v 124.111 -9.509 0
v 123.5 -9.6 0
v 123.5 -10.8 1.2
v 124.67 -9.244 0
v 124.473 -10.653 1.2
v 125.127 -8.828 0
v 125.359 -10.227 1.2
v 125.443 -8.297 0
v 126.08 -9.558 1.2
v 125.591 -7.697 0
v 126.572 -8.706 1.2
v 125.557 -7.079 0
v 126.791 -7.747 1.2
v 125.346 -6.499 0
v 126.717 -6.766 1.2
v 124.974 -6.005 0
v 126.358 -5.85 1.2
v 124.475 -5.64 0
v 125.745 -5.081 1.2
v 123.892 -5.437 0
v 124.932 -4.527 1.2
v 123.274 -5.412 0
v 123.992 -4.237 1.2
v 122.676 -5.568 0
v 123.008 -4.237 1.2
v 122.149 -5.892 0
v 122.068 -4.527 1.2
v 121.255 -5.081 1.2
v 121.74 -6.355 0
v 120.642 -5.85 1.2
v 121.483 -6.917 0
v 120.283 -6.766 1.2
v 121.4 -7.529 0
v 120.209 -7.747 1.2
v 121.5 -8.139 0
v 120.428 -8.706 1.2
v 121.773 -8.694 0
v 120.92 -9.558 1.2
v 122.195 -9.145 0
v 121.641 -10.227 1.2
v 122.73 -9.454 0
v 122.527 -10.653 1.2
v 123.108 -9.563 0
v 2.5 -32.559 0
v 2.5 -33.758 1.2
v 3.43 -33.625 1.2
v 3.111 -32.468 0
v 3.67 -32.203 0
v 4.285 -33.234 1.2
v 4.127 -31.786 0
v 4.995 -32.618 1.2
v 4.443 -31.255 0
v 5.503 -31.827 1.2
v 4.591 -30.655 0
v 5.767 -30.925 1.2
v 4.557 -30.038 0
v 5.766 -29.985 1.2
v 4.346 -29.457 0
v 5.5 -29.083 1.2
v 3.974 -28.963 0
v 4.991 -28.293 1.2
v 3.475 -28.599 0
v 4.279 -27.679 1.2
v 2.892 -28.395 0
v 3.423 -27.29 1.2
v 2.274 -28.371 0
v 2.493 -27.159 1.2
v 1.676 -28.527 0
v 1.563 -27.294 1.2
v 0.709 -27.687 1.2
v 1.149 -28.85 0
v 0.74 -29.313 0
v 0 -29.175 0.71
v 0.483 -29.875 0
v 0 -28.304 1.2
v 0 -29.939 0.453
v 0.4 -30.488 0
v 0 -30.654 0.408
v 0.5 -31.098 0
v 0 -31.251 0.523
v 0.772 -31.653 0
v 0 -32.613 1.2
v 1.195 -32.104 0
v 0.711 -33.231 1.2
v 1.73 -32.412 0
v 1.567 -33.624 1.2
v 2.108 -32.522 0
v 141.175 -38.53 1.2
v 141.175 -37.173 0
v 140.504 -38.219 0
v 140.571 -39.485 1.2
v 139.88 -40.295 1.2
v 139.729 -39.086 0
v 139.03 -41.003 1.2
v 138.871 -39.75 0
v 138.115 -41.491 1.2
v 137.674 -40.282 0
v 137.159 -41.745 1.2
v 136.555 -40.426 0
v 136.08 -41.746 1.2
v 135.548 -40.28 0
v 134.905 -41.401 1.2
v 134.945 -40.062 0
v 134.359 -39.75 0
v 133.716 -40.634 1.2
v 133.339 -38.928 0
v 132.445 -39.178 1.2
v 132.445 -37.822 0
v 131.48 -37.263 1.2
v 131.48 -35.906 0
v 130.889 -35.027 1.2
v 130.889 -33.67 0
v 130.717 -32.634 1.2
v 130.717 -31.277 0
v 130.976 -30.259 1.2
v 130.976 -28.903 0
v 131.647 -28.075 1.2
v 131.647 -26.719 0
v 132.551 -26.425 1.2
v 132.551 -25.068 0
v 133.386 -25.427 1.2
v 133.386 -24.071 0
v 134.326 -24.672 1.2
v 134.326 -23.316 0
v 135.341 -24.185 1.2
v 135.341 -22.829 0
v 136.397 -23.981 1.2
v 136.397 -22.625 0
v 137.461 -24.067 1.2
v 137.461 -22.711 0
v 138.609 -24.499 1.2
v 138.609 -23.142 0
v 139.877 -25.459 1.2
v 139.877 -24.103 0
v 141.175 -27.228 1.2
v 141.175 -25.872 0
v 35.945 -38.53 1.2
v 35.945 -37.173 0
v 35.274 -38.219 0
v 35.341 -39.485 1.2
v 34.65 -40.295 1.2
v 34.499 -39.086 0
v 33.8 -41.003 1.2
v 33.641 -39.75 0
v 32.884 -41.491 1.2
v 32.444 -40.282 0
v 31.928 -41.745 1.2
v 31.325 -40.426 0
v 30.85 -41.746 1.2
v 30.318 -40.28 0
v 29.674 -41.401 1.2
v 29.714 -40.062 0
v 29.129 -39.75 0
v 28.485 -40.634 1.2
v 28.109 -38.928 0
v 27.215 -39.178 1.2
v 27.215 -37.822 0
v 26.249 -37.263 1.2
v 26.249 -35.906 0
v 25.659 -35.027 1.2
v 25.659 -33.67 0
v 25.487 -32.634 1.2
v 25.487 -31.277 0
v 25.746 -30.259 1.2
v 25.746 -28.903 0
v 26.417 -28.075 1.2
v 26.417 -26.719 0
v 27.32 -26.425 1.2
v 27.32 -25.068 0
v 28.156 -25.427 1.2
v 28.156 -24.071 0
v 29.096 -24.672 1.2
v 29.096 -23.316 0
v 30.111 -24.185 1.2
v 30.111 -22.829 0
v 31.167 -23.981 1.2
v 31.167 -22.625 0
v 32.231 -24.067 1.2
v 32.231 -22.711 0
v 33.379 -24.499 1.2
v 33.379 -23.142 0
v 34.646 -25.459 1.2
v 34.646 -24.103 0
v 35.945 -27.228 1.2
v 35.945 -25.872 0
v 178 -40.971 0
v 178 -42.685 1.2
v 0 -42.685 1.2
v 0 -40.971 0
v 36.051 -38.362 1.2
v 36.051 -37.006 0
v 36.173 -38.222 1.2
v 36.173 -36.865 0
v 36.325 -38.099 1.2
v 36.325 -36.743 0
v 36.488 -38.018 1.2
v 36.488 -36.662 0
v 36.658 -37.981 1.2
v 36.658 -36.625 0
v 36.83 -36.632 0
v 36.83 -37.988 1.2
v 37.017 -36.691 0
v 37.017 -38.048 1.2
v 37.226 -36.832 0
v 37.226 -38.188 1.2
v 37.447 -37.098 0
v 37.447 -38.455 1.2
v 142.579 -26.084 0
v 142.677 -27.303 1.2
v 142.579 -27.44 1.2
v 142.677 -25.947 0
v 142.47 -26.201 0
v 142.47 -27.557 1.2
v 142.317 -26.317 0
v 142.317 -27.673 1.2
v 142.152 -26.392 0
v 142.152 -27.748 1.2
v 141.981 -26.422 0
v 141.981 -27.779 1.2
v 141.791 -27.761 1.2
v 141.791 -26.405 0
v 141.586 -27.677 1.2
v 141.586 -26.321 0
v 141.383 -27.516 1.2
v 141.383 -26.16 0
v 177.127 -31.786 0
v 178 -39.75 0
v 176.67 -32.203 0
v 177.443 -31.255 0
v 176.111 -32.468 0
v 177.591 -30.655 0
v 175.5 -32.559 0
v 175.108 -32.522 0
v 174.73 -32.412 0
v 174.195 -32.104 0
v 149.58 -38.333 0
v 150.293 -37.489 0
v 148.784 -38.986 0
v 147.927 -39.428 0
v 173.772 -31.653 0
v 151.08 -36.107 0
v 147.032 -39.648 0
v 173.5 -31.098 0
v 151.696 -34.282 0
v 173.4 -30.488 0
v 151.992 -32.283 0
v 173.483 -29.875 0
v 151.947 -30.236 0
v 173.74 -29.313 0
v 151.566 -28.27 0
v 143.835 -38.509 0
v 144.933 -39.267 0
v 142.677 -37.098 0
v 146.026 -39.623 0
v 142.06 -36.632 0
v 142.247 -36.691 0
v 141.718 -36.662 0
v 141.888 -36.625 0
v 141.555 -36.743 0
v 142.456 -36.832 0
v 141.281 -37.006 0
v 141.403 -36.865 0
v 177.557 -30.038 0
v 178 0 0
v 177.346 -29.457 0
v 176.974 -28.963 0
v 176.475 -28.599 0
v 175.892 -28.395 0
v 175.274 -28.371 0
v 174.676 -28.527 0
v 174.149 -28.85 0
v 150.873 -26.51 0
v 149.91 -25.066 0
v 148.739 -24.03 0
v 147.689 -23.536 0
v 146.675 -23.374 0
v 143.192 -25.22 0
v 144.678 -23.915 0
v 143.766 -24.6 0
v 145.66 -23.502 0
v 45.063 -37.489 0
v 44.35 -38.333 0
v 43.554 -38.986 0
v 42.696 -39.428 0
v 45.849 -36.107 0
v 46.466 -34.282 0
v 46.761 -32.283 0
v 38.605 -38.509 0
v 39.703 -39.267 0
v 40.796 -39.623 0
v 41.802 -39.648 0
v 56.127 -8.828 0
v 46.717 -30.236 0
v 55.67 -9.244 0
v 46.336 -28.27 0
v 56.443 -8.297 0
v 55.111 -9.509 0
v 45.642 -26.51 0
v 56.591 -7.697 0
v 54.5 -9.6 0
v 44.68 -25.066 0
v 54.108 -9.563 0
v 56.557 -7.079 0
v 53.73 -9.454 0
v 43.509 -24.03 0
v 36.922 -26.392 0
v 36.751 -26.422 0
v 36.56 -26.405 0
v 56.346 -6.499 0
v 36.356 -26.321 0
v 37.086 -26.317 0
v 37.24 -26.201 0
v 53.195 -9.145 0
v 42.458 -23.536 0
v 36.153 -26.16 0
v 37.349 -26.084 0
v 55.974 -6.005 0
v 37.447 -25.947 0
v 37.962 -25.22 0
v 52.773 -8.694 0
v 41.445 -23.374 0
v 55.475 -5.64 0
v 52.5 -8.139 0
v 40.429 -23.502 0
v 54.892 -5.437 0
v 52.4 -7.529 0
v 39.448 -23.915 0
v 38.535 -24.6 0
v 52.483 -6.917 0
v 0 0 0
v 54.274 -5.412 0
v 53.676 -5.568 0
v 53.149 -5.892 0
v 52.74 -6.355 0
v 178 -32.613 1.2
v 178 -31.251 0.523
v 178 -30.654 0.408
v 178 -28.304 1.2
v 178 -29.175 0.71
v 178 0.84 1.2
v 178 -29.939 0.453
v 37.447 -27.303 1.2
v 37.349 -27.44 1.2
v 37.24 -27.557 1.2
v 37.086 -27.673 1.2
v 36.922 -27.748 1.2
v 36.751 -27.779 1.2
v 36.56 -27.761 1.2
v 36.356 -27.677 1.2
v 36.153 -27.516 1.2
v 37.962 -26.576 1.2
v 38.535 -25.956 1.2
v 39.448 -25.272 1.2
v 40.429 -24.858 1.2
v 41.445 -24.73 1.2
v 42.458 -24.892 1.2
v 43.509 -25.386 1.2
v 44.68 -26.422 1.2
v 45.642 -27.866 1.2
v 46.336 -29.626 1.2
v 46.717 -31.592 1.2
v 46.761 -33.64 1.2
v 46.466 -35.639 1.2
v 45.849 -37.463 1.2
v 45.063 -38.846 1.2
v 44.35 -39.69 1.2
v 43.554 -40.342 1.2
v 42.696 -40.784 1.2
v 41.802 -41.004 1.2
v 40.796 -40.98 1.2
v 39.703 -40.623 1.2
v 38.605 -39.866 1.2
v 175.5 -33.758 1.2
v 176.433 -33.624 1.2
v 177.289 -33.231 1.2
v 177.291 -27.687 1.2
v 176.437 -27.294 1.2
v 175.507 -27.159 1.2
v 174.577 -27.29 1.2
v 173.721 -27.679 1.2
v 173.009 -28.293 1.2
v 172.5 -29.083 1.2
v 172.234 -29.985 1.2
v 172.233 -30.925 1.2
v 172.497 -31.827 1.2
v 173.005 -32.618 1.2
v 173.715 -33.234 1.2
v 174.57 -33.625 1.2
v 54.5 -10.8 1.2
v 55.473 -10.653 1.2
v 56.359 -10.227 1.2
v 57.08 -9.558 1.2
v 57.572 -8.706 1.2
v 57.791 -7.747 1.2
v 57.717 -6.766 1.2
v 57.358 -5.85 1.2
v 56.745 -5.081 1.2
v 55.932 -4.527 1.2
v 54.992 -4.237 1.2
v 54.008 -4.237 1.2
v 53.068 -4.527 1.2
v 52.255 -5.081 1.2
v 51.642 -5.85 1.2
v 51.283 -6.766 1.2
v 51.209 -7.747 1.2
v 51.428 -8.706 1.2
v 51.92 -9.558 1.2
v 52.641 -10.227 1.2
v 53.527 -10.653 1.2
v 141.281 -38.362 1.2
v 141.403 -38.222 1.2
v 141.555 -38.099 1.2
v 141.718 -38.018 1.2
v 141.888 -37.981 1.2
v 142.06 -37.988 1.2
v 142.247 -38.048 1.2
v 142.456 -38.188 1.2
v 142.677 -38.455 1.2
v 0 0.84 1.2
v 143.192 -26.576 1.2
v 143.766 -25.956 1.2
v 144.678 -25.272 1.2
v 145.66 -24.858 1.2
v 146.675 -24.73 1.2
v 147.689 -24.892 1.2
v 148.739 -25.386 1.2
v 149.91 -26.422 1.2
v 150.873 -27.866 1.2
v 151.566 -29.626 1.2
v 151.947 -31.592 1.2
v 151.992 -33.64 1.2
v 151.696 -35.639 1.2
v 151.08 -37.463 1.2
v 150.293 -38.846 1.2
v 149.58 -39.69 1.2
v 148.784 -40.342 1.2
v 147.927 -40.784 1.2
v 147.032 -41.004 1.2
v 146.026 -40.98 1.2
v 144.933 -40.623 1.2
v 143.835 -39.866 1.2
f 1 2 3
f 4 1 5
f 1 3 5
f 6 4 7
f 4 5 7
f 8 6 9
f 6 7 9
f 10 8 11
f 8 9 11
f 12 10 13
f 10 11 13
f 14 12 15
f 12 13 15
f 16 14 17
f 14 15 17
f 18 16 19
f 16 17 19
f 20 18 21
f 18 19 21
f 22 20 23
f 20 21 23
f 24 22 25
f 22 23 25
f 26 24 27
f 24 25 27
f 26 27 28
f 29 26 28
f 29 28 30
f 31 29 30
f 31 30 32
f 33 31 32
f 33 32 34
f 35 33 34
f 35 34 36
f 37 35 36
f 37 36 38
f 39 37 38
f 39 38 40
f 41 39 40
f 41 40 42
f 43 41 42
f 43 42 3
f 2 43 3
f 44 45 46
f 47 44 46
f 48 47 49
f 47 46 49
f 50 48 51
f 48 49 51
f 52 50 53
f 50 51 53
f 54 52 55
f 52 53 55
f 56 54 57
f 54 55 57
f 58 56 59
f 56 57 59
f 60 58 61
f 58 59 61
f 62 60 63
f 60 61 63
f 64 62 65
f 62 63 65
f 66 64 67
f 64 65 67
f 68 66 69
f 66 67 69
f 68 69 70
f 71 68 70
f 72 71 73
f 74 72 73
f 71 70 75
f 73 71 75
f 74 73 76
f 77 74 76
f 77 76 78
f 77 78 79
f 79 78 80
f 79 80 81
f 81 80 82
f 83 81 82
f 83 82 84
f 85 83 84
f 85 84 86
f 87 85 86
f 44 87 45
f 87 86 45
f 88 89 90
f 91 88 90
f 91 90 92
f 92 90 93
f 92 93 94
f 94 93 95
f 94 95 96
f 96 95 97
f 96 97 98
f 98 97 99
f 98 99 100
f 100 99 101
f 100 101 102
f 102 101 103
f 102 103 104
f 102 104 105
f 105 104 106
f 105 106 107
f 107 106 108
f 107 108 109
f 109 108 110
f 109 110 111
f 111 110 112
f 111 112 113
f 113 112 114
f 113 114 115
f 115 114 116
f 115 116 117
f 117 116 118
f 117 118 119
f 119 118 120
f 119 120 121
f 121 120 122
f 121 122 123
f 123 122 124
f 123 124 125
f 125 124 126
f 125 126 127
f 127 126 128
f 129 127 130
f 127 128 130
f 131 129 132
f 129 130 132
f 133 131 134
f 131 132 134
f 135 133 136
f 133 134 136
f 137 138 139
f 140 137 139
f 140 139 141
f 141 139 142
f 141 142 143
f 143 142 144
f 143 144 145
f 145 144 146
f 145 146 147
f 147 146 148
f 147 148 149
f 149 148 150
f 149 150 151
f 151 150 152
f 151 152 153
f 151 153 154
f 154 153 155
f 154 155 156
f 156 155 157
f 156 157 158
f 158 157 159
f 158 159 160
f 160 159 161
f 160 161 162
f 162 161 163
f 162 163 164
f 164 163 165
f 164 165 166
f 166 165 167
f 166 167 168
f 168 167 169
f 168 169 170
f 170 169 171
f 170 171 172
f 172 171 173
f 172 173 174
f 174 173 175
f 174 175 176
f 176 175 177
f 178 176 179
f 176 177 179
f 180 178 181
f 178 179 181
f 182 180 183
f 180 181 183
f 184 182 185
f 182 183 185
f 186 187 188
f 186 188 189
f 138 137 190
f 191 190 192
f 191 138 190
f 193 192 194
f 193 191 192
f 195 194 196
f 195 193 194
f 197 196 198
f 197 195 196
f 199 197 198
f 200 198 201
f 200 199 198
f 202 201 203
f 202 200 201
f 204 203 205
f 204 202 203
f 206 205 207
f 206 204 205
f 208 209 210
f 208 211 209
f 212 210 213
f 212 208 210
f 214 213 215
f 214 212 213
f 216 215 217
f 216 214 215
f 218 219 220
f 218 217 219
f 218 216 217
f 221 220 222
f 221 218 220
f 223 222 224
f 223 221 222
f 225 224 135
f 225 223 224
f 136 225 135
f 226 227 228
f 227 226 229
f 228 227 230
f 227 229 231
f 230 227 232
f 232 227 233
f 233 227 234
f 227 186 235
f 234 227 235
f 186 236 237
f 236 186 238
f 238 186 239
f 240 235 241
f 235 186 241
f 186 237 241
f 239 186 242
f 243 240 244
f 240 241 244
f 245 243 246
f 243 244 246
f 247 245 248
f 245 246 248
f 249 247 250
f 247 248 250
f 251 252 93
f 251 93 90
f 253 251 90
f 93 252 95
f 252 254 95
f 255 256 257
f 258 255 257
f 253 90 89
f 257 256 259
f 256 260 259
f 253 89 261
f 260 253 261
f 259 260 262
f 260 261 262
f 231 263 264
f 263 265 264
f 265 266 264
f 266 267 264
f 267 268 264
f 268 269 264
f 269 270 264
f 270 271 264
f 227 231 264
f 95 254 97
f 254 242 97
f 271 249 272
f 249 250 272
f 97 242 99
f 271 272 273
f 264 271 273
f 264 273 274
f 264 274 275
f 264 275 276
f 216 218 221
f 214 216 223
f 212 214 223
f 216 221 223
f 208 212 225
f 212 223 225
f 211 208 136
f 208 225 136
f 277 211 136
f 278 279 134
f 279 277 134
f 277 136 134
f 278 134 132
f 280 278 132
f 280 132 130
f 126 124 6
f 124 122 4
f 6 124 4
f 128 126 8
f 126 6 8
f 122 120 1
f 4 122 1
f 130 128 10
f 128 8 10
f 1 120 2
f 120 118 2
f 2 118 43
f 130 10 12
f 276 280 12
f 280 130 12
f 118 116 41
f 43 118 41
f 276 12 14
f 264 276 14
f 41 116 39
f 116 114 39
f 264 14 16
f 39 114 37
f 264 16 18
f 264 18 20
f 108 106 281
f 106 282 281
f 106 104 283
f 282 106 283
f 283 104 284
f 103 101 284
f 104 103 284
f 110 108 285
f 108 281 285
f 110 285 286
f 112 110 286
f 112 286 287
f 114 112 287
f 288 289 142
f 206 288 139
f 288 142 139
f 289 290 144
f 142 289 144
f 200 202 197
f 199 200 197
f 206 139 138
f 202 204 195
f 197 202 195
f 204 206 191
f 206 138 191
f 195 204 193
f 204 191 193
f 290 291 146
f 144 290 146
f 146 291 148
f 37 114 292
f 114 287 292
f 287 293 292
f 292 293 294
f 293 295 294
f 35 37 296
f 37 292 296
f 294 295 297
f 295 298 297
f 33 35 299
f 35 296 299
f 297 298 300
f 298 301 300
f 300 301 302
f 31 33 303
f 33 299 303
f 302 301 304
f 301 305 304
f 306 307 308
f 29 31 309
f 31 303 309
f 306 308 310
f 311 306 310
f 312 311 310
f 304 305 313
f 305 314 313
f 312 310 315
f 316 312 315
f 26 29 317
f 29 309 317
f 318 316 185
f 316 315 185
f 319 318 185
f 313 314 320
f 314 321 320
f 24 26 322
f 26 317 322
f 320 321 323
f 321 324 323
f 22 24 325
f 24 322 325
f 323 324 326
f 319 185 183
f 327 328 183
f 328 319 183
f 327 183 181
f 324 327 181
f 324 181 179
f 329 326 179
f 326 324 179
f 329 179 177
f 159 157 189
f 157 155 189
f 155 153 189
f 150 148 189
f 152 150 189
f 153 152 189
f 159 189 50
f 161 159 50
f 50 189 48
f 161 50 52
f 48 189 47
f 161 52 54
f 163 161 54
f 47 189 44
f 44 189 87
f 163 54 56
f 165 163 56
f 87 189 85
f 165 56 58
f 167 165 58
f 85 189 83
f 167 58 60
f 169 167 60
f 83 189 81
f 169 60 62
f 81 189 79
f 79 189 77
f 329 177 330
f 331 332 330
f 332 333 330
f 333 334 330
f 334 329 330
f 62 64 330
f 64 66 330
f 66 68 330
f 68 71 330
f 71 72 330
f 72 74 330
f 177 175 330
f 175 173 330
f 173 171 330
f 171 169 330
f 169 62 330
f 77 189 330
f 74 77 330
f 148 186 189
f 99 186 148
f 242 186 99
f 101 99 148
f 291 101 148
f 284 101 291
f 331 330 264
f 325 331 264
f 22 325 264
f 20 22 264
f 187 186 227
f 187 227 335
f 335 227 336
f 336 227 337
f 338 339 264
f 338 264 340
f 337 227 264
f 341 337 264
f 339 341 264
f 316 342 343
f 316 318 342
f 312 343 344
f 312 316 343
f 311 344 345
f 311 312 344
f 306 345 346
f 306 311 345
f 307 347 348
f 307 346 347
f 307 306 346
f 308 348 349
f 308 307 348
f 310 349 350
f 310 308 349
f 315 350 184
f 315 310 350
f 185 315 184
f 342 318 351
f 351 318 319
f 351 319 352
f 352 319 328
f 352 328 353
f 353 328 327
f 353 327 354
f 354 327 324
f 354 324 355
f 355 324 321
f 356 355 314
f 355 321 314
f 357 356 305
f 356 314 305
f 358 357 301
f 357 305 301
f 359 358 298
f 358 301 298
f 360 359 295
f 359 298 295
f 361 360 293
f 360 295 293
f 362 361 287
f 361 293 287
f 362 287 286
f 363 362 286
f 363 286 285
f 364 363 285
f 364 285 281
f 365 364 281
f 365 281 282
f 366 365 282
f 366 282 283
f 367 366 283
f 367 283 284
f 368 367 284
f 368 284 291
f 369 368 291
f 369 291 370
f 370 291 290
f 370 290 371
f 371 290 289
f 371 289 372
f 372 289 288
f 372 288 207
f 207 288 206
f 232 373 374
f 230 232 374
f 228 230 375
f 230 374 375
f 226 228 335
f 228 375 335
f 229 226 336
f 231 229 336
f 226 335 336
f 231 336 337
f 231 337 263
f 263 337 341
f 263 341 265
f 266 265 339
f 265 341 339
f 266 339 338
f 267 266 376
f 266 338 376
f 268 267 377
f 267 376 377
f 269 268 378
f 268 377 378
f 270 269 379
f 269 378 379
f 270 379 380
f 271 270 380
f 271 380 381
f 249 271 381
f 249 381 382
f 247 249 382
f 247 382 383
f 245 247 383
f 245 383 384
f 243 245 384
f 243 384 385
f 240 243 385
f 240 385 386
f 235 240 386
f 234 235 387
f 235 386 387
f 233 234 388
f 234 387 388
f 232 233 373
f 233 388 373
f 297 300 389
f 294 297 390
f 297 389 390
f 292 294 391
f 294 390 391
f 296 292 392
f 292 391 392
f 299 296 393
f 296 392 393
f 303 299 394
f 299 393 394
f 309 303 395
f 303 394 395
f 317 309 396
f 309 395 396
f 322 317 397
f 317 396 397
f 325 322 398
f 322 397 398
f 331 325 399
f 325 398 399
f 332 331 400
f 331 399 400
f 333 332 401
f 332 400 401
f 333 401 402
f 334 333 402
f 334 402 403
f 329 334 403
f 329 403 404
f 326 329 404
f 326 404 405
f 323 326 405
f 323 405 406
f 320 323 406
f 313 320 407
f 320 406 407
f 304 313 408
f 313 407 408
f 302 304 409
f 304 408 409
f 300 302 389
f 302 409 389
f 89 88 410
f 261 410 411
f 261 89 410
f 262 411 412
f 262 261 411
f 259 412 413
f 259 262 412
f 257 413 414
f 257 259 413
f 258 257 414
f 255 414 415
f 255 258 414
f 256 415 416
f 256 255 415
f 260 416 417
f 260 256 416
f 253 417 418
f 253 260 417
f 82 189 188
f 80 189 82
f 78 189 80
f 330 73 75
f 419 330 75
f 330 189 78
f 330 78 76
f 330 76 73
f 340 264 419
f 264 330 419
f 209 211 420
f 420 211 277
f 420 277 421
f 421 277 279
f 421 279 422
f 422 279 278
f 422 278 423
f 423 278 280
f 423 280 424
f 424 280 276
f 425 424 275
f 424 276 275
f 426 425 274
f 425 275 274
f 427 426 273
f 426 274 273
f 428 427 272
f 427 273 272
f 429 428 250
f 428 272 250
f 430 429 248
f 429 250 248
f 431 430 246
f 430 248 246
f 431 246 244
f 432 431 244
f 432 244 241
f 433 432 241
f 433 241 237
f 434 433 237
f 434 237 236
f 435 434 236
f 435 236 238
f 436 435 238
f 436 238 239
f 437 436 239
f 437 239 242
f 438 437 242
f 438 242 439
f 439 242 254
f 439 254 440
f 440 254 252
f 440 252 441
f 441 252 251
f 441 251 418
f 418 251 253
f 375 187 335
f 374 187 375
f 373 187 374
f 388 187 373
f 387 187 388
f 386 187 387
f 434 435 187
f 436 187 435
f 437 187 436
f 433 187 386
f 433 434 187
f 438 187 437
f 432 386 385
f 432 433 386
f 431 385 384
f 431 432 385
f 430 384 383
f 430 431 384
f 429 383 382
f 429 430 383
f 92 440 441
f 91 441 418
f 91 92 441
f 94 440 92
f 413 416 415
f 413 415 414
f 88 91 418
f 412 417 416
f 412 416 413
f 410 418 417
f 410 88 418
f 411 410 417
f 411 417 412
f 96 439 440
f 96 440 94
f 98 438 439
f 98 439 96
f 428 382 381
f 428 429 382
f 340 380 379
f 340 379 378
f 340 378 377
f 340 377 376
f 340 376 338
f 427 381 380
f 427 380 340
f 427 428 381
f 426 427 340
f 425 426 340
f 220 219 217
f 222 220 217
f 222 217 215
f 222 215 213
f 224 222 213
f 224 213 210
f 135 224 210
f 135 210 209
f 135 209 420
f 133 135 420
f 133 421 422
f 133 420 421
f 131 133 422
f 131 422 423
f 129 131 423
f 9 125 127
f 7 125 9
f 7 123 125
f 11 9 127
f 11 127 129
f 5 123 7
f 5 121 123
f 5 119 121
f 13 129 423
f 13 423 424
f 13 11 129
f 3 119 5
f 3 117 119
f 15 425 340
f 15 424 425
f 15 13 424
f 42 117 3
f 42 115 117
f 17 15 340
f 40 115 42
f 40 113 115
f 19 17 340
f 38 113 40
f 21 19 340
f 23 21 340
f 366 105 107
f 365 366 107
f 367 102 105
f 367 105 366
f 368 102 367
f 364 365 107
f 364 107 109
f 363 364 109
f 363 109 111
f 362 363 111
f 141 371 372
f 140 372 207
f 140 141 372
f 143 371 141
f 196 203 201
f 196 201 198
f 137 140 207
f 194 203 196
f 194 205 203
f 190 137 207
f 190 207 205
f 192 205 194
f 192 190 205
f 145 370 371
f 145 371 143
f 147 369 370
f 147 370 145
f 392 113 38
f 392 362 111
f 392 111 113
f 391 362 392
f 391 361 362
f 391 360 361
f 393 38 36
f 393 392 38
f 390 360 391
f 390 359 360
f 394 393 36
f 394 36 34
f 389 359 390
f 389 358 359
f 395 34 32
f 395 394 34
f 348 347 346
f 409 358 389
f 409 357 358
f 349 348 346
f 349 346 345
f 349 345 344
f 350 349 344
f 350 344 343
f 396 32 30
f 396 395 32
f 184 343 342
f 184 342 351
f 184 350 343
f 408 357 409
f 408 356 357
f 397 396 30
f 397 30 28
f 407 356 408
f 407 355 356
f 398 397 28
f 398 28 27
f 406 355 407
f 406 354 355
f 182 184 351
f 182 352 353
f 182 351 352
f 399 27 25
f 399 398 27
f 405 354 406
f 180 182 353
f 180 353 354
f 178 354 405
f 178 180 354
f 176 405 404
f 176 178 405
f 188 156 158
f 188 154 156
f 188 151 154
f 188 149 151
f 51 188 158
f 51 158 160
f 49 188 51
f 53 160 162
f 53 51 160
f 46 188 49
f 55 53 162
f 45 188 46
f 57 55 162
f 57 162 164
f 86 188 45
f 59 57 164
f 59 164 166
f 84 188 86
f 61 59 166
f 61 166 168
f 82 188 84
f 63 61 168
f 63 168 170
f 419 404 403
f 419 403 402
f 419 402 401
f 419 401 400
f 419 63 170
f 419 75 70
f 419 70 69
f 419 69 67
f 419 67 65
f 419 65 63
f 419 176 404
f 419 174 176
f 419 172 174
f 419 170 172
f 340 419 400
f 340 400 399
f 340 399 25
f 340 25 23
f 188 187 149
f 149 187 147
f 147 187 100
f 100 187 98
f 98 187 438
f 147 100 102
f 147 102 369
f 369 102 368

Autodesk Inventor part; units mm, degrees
ref_plane "YZ Plane" through (0, 0, 0) normal (1, 0, 0) x (0, 1, 0)
ref_plane "XZ Plane" through (0, 0, 0) normal (0, 1, 0) x (-1, 0, 0)
ref_plane "Work Plane1" through (0, -45.8455, -0.8595) normal (-1, 0, 0) x (0, 0.5735764, 0.819152)
sketch "Sketch1" plane through (0, -45.8455, -0.8595) normal (-1, 0, 0) x (0, 0.5735764, 0.819152)
  line L0 (4.2002, 4.5) -> (27, 37.0615) projected
  line L1 (3.5, -0.5) -> (3.5, 3.5) projected
  line L2 (27, 37.0615) -> (28, 37.0615) projected
  line L3 (27, 37.0615) -> (3.5, 3.5)
  line L4 (3.5, 1.4079) -> (28.4649, 37.0615)
  line L5 (27, 37.0615) -> (28.4649, 37.0615)
  point P0 (4.2002, 4.5)
  dimension "d0" = 1.2
  dimension "d1" = 55
ref_plane "Work Plane2" through (178, -42.7329, -77.104) normal (1, 0, 0) x (0, 0.819152, -0.5735764)
extrude "Extrusion1" add sketch "Sketch1" against normal up to surface (178 mm away)
ref_plane "Work Plane3" through (36.3849, -23.4357, -7.1547) normal (0, -0.7489557, 0.66262) x (1, 0, 0)
ref_plane "Work Plane4" through (36.3849, -23.4357, -7.1547) normal (0, -0.7489557, 0.66262) x (1, 0, 0)
sketch "Sketch4" plane through (36.3849, -23.4357, -7.1547) normal (0, -0.7489557, 0.66262) x (1, 0, 0)
  line L0 (-14.9215, 5.4518) -> (-14.9215, -5.4534)
  spline S0 degree 3 poles (-14.9215, -5.4534) (-14.9222, -5.5772) (-14.8715, -5.6989) (-14.7851, -5.7853) (-14.7653, -5.8051) (-14.7437, -5.823) (-14.7206, -5.8388) (-14.7012, -5.8521) (-14.6808, -5.864) (-14.6595, -5.8743) (-14.6436, -5.882) (-14.6272, -5.8889) (-14.6105, -5.8948) (-14.5603, -5.9125) (-14.5071, -5.9218) (-14.4534, -5.9215) knots 0 0 0 0 0.5 0.5 0.5 0.614375 0.614375 0.614375 0.710781 0.710781 0.710781 0.783086 0.783086 0.783086 1 1 1 1
  line L1 (-14.4534, -5.9215) -> (14.4534, -5.9215)
  spline S1 degree 3 poles (14.4534, -5.9215) (14.5775, -5.9222) (14.6994, -5.8713) (14.8723, -5.6977) (14.9222, -5.5758) (14.9215, -5.4518) knots 0 0 0 0 0.5 0.5 1 1 1 1
  line L2 (14.9215, -5.4518) -> (14.9215, 5.4534)
  spline S2 degree 3 poles (14.9215, 5.4534) (14.9222, 5.5775) (14.8713, 5.6994) (14.6977, 5.8723) (14.5758, 5.9222) (14.4518, 5.9215) knots 0 0 0 0 0.5 0.5 1 1 1 1
  line L3 (14.4518, 5.9215) -> (-14.4534, 5.9215)
  spline S3 degree 3 poles (-14.4534, 5.9215) (-14.5775, 5.9222) (-14.6994, 5.8713) (-14.8723, 5.6977) (-14.9222, 5.5758) (-14.9215, 5.4518) knots 0 0 0 0 0.5 0.5 1 1 1 1
  circle A0 centre (-13.3791, -4.3791) radius 0.5
  circle A1 centre (-13.3791, 4.3791) radius 0.5
  circle A2 centre (13.3791, 4.3791) radius 0.5
  circle A3 centre (13.3791, -4.3791) radius 0.5
  arc A4 (0.2617, -1.4512) -> (0.1811, -1.5218) centre (0.2771, -1.55) ccw
  arc A5 (0.1811, 1.5218) -> (0.1811, -1.5218) centre (-5, 0) ccw
  arc A6 (0.1811, 1.5218) -> (0.2617, 1.4512) centre (0.2771, 1.55) ccw
  arc A7 (0.2617, 1.4512) -> (0.3414, 1.519) centre (0.2463, 1.55) ccw
  arc A8 (0.3414, -1.519) -> (0.3414, 1.519) centre (5, 0) ccw
  arc A9 (0.3414, -1.519) -> (0.2617, -1.4512) centre (0.2463, -1.55) ccw
  line L4 (90.3087, 5.4518) -> (90.3087, -5.4534)
  spline S4 degree 3 poles (90.3087, -5.4534) (90.308, -5.5772) (90.3587, -5.6989) (90.4451, -5.7853) (90.4649, -5.8051) (90.4865, -5.823) (90.5096, -5.8388) (90.529, -5.8521) (90.5494, -5.864) (90.5707, -5.8743) (90.5866, -5.882) (90.603, -5.8889) (90.6197, -5.8948) (90.6699, -5.9125) (90.7231, -5.9218) (90.7769, -5.9215) knots 0 0 0 0 0.5 0.5 0.5 0.614375 0.614375 0.614375 0.710781 0.710781 0.710781 0.783086 0.783086 0.783086 1 1 1 1
  line L5 (90.7769, -5.9215) -> (119.6836, -5.9215)
  spline S5 degree 3 poles (119.6836, -5.9215) (119.8077, -5.9222) (119.9296, -5.8713) (120.1025, -5.6977) (120.1524, -5.5758) (120.1517, -5.4518) knots 0 0 0 0 0.5 0.5 1 1 1 1
  line L6 (120.1517, -5.4518) -> (120.1517, 5.4534)
  spline S6 degree 3 poles (120.1517, 5.4534) (120.1524, 5.5775) (120.1015, 5.6994) (119.9279, 5.8723) (119.806, 5.9222) (119.682, 5.9215) knots 0 0 0 0 0.5 0.5 1 1 1 1
  line L7 (119.682, 5.9215) -> (90.7769, 5.9215)
  spline S7 degree 3 poles (90.7769, 5.9215) (90.6527, 5.9222) (90.5308, 5.8713) (90.3579, 5.6977) (90.308, 5.5758) (90.3087, 5.4518) knots 0 0 0 0 0.5 0.5 1 1 1 1
  circle A10 centre (91.8511, -4.3791) radius 0.5
  circle A11 centre (91.8511, 4.3791) radius 0.5
  circle A12 centre (118.6093, 4.3791) radius 0.5
  circle A13 centre (118.6093, -4.3791) radius 0.5
  arc A14 (105.4919, -1.4512) -> (105.4113, -1.5218) centre (105.5073, -1.55) ccw
  arc A15 (105.4113, 1.5218) -> (105.4113, -1.5218) centre (100.2302, 0) ccw
  arc A16 (105.4113, 1.5218) -> (105.4919, 1.4512) centre (105.5073, 1.55) ccw
  arc A17 (105.4919, 1.4512) -> (105.5716, 1.519) centre (105.4765, 1.55) ccw
  arc A18 (105.5716, -1.519) -> (105.5716, 1.519) centre (110.2302, 0) ccw
  arc A19 (105.5716, -1.519) -> (105.4919, -1.4512) centre (105.4765, -1.55) ccw
  arc A20 (105.5127, 2.6278) -> (105.5127, -2.6278) centre (100.2302, 0) ccw
  arc A21 (105.5127, -2.6278) -> (105.5127, 2.6278) centre (110.2302, 0) ccw
  arc A22 (0.2825, 2.6278) -> (0.2825, -2.6278) centre (-5, 0) ccw
  arc A23 (0.2825, -2.6278) -> (0.2825, 2.6278) centre (5, 0) ccw
  point P0 (-36.3849, 20.8875)
  dimension "d27" = 0.5
  dimension "d28" = 0.5
extrude "Extrusion2" cut sketch "Sketch4" along normal up to next contours A4 A5 A6 A7 A8 A9 | A14 A15 A16 A17 A18 A19 | A21 A20 | A23 A22
sketch "Sketch6" plane through (0, -42.6848, 1.2) normal (0, 0, 1) x (1, 0, 0)
  circle A0 centre (54.5, 35.1848) radius 2.3 projected
  circle A1 centre (123.5, 35.1848) radius 2.3 projected
  circle A2 centre (2.5, 12.2262) radius 2.3 projected
  circle A3 centre (175.5, 12.2262) radius 2.3 projected
  point P0 (0, 42.6848)
hole "Hole1" at (54.5, -7.5, 1.2) at (123.5, -7.5, 1.2) at (2.5, -30.4585, 1.2) at (175.5, -30.4585, 1.2) direction (0, 0, -1) diameter 3.6 end through all countersink diameter 6.6 countersink angle 90 clearance for "Countersunk Flat Head Screw ISO 2009/7046" size "M3" standard "ISO"
fillet "Fillet1" radius 1 4 edges at (36.6674, -36.1666, 0.6) (36.6674, -28.2351, 0.6) (141.8976, -28.2351, 0.6) (141.8976, -36.1666, 0.6)
properties part number "front" material "Nylon 6/6"
